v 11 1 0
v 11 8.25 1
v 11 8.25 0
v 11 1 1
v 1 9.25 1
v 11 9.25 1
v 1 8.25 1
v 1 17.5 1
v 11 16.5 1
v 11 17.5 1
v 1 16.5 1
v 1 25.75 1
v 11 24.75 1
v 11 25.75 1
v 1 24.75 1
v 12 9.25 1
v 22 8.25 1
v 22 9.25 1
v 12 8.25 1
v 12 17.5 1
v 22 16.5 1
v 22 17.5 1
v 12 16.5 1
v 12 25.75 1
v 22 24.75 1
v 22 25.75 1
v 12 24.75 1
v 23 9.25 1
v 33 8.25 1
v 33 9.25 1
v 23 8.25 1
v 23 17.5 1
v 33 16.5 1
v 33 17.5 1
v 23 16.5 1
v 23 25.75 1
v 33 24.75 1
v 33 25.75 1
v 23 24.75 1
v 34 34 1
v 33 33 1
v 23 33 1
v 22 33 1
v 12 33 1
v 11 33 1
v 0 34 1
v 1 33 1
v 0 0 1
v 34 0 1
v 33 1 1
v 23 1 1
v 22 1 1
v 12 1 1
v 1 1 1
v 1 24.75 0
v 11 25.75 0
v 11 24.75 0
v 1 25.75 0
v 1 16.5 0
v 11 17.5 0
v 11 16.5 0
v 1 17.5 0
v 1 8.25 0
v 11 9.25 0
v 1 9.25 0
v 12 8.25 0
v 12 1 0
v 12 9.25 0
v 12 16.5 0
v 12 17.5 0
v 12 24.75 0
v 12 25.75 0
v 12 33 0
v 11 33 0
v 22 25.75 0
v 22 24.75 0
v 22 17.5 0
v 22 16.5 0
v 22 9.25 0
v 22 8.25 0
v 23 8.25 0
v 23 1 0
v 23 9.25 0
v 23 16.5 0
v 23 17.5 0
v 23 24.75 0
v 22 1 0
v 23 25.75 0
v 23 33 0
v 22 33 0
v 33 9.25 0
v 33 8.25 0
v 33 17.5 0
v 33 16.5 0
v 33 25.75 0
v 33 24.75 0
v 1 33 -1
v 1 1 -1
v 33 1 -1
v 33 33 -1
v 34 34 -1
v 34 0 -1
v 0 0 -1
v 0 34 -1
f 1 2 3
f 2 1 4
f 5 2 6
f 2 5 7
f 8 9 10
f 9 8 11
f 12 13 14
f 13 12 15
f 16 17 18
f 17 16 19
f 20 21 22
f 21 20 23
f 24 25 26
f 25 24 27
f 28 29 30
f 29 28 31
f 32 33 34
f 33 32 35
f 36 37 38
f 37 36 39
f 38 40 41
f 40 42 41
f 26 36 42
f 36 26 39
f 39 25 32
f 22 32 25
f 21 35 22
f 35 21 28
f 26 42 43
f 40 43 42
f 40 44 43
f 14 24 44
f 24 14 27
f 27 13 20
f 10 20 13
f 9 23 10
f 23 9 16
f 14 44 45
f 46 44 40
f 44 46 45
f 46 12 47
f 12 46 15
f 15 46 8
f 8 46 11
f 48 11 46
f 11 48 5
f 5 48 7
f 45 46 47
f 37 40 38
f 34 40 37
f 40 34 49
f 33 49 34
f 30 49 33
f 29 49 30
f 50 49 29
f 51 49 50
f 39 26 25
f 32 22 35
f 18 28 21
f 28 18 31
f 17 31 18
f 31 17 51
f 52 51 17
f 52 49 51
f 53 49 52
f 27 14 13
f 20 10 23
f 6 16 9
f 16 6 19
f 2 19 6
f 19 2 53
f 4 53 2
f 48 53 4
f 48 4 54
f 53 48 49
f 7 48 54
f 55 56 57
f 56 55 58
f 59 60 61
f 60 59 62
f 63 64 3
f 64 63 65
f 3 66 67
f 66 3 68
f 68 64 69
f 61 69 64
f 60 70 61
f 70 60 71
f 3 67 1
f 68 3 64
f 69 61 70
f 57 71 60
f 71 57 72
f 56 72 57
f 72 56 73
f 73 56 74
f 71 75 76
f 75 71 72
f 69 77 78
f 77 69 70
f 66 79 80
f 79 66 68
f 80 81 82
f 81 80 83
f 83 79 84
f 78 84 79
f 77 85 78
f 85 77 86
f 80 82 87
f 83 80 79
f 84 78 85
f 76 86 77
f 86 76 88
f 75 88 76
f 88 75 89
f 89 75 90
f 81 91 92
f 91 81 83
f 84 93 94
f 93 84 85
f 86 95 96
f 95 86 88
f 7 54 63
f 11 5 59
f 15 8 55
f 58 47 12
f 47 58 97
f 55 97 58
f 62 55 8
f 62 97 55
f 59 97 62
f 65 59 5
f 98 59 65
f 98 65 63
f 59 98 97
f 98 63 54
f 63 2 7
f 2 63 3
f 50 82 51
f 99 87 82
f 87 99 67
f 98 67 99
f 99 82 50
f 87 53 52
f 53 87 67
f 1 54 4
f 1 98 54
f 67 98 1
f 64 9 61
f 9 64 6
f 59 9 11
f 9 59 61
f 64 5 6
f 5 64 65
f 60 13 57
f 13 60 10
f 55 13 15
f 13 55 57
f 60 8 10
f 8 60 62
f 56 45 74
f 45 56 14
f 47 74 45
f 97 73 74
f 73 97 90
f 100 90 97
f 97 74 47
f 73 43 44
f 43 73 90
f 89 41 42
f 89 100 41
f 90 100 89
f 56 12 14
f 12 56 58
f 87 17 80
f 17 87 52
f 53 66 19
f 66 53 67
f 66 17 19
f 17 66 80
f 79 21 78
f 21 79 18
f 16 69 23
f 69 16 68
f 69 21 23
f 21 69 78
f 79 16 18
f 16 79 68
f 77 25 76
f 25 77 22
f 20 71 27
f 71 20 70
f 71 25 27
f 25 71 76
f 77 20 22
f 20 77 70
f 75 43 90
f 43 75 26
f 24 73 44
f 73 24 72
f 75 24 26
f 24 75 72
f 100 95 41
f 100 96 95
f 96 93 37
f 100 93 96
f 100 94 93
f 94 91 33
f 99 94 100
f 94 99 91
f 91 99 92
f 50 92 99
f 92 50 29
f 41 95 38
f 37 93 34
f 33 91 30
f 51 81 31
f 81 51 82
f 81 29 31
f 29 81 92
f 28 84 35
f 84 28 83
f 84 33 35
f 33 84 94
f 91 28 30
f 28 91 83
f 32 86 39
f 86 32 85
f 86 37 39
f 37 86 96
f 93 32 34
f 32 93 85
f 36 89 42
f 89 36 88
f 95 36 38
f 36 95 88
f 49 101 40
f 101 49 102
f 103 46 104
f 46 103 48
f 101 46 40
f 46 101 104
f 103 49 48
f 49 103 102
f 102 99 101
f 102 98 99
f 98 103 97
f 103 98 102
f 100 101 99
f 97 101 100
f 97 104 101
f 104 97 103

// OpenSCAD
module kbd_frame(size, border, n, m) {
    module buttons(size, margin, n, m) {
        btnSize = [(size[0] - margin[0]*(n-1))/n, (size[1] - margin[1]*(m-1))/m, size[2]];
        for(i=[0: n-1]) {
            for(j=[0: m-1]) {
                translate([i*(btnSize[0] + margin[0]), j*(btnSize[1] + margin[1]), 0]) cube(btnSize);
            }
        }
    }

    difference() {
        cube([size[0] + 2*border[0], size[1] + 2*border[1], size[2]]);
        translate(border) buttons(size=size, margin=border, n=n, m=m);
    }
    translate([0, 0, -1]) difference() {
        cube([size[0] + 2*border[0], size[1] + 2*border[1], 1]);
        translate(border) cube(size);
    }
}

kbd_frame(size=[32, 32, 1], border=[1, 1, 0], n=3, m=4);
